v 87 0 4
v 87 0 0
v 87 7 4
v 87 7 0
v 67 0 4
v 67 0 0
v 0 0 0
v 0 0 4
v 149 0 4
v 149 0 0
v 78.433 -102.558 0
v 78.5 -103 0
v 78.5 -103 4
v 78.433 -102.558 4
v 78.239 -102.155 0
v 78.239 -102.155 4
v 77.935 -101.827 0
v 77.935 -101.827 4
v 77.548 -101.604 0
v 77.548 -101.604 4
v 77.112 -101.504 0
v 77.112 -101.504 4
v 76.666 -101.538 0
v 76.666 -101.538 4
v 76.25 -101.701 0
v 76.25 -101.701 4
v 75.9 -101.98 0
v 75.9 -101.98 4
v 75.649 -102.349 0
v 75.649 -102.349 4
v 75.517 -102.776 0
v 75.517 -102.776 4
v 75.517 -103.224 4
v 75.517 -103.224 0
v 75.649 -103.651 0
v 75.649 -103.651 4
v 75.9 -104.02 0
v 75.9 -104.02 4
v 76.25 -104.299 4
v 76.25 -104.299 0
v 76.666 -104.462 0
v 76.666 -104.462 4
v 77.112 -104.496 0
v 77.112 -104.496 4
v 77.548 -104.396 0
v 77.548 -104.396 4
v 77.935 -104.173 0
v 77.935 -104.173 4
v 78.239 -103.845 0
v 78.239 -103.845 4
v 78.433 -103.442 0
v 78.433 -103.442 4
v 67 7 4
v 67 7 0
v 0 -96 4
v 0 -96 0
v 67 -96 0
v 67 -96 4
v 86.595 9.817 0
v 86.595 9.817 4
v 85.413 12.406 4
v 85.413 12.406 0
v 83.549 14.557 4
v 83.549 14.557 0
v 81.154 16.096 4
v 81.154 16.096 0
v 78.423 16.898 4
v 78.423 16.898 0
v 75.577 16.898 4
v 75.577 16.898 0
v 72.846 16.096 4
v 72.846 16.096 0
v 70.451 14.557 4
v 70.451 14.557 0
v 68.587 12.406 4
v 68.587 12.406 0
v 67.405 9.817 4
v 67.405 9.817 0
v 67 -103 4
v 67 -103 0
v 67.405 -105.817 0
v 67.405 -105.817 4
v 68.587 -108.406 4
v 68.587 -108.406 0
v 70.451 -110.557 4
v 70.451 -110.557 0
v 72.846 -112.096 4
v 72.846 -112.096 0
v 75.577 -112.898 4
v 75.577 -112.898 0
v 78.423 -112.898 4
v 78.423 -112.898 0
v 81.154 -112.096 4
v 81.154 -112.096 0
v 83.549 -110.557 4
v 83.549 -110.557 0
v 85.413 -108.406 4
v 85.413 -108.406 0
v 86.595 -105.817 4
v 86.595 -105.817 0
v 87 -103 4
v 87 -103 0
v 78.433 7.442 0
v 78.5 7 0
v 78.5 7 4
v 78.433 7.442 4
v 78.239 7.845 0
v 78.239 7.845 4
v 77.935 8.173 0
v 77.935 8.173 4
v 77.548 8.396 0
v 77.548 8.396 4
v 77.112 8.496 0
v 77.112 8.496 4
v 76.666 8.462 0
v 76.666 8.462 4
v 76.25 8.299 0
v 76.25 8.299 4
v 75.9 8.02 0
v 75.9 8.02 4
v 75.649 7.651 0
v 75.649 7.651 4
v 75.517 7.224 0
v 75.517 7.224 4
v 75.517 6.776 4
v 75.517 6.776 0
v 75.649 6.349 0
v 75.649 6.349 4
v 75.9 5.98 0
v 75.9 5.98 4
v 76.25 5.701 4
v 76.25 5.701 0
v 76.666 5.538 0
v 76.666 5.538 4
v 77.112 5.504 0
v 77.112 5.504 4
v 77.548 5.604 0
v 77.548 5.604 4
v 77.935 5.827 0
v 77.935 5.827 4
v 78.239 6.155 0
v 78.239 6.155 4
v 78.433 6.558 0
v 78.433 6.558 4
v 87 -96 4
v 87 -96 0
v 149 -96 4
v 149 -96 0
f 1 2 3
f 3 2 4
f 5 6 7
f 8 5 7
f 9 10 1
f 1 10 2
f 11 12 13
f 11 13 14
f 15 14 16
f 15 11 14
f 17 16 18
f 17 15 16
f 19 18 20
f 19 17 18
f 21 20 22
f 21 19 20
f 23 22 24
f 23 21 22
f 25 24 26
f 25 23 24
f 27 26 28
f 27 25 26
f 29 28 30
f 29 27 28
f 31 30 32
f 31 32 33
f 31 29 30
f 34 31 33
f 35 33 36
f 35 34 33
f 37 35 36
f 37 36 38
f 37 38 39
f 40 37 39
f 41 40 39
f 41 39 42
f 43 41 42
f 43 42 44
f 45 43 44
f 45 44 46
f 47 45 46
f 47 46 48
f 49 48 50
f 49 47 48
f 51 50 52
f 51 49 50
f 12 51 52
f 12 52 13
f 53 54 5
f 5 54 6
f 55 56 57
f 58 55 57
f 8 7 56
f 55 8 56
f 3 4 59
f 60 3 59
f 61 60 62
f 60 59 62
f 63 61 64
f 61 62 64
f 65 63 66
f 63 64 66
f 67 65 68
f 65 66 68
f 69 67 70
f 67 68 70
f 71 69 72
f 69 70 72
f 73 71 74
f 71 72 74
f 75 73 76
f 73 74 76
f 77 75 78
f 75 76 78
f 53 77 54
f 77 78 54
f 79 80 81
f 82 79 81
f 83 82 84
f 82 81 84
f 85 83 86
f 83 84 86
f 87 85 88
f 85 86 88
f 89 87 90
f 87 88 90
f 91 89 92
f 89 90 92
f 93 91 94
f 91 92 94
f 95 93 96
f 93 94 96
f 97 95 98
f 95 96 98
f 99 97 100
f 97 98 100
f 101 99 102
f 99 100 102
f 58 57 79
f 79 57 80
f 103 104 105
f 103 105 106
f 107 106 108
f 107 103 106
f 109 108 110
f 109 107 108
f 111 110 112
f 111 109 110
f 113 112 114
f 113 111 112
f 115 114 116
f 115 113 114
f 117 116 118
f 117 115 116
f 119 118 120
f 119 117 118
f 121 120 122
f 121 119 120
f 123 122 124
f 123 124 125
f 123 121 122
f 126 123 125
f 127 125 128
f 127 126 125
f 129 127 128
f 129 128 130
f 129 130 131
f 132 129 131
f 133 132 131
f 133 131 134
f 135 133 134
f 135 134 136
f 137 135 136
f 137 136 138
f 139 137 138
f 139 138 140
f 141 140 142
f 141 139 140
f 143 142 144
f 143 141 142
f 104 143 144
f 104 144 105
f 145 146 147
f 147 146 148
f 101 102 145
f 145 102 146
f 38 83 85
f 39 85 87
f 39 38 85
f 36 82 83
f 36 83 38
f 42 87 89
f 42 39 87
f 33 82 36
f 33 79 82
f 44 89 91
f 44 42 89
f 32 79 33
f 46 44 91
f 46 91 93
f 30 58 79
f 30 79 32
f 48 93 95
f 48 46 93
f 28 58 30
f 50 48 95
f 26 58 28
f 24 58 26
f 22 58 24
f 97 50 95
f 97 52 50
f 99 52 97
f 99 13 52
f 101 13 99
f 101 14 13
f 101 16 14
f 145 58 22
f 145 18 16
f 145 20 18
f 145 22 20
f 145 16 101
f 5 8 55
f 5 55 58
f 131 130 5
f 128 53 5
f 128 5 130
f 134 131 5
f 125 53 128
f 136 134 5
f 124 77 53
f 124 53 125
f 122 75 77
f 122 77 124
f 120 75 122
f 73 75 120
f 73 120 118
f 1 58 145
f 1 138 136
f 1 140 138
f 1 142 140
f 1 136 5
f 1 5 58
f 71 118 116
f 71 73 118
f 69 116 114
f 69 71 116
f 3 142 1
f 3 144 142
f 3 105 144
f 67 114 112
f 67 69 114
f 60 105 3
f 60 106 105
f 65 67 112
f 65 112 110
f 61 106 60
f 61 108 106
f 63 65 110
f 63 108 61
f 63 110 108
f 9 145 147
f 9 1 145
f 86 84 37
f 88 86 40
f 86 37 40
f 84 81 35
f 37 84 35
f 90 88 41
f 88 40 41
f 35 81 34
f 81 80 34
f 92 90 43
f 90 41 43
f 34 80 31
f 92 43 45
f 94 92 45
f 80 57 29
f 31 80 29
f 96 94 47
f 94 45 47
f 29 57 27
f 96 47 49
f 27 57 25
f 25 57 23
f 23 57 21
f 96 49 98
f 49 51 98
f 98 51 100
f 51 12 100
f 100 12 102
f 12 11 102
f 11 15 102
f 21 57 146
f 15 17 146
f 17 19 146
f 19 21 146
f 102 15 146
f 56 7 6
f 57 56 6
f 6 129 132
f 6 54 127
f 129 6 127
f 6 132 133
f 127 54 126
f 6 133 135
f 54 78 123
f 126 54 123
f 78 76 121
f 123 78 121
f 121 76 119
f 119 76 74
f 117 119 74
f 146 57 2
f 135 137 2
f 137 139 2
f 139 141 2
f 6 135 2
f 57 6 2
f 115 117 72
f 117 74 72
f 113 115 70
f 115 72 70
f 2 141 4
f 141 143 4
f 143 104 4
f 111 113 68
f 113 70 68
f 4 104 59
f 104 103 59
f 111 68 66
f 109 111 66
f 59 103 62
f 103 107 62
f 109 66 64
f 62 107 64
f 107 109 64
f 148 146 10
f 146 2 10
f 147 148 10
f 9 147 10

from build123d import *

# Parameters (mm, degrees)
SKETCH1_R           = 1.5
BOSS_EXTRUDE1_DEPTH = 4


with BuildPart() as part:
    # Sketch1 → Boss-Extrude1 (new body)
    with BuildSketch(Plane.XY):
        with BuildLine():
            Line((0, 0), (0, -96))
            Line((0, -96), (67, -96))
            Line((67, -96), (67, -103))
            ThreePointArc((67, -103), (77, -113), (87, -103))
            Line((87, -103), (87, -96))
            Line((87, -96), (149, -96))
            Line((149, -96), (149, 0))
            Line((149, 0), (87, 0))
            Line((87, 0), (87, 7))
            ThreePointArc((87, 7), (77, 17), (67, 7))
            Line((67, 7), (67, 0))
            Line((67, 0), (0, 0))
        make_face()
        with Locations((77, -103)):
            Circle(SKETCH1_R, mode=Mode.SUBTRACT)
        with Locations((77, 7)):
            Circle(SKETCH1_R, mode=Mode.SUBTRACT)
    extrude(amount=BOSS_EXTRUDE1_DEPTH)


solid = part.part
